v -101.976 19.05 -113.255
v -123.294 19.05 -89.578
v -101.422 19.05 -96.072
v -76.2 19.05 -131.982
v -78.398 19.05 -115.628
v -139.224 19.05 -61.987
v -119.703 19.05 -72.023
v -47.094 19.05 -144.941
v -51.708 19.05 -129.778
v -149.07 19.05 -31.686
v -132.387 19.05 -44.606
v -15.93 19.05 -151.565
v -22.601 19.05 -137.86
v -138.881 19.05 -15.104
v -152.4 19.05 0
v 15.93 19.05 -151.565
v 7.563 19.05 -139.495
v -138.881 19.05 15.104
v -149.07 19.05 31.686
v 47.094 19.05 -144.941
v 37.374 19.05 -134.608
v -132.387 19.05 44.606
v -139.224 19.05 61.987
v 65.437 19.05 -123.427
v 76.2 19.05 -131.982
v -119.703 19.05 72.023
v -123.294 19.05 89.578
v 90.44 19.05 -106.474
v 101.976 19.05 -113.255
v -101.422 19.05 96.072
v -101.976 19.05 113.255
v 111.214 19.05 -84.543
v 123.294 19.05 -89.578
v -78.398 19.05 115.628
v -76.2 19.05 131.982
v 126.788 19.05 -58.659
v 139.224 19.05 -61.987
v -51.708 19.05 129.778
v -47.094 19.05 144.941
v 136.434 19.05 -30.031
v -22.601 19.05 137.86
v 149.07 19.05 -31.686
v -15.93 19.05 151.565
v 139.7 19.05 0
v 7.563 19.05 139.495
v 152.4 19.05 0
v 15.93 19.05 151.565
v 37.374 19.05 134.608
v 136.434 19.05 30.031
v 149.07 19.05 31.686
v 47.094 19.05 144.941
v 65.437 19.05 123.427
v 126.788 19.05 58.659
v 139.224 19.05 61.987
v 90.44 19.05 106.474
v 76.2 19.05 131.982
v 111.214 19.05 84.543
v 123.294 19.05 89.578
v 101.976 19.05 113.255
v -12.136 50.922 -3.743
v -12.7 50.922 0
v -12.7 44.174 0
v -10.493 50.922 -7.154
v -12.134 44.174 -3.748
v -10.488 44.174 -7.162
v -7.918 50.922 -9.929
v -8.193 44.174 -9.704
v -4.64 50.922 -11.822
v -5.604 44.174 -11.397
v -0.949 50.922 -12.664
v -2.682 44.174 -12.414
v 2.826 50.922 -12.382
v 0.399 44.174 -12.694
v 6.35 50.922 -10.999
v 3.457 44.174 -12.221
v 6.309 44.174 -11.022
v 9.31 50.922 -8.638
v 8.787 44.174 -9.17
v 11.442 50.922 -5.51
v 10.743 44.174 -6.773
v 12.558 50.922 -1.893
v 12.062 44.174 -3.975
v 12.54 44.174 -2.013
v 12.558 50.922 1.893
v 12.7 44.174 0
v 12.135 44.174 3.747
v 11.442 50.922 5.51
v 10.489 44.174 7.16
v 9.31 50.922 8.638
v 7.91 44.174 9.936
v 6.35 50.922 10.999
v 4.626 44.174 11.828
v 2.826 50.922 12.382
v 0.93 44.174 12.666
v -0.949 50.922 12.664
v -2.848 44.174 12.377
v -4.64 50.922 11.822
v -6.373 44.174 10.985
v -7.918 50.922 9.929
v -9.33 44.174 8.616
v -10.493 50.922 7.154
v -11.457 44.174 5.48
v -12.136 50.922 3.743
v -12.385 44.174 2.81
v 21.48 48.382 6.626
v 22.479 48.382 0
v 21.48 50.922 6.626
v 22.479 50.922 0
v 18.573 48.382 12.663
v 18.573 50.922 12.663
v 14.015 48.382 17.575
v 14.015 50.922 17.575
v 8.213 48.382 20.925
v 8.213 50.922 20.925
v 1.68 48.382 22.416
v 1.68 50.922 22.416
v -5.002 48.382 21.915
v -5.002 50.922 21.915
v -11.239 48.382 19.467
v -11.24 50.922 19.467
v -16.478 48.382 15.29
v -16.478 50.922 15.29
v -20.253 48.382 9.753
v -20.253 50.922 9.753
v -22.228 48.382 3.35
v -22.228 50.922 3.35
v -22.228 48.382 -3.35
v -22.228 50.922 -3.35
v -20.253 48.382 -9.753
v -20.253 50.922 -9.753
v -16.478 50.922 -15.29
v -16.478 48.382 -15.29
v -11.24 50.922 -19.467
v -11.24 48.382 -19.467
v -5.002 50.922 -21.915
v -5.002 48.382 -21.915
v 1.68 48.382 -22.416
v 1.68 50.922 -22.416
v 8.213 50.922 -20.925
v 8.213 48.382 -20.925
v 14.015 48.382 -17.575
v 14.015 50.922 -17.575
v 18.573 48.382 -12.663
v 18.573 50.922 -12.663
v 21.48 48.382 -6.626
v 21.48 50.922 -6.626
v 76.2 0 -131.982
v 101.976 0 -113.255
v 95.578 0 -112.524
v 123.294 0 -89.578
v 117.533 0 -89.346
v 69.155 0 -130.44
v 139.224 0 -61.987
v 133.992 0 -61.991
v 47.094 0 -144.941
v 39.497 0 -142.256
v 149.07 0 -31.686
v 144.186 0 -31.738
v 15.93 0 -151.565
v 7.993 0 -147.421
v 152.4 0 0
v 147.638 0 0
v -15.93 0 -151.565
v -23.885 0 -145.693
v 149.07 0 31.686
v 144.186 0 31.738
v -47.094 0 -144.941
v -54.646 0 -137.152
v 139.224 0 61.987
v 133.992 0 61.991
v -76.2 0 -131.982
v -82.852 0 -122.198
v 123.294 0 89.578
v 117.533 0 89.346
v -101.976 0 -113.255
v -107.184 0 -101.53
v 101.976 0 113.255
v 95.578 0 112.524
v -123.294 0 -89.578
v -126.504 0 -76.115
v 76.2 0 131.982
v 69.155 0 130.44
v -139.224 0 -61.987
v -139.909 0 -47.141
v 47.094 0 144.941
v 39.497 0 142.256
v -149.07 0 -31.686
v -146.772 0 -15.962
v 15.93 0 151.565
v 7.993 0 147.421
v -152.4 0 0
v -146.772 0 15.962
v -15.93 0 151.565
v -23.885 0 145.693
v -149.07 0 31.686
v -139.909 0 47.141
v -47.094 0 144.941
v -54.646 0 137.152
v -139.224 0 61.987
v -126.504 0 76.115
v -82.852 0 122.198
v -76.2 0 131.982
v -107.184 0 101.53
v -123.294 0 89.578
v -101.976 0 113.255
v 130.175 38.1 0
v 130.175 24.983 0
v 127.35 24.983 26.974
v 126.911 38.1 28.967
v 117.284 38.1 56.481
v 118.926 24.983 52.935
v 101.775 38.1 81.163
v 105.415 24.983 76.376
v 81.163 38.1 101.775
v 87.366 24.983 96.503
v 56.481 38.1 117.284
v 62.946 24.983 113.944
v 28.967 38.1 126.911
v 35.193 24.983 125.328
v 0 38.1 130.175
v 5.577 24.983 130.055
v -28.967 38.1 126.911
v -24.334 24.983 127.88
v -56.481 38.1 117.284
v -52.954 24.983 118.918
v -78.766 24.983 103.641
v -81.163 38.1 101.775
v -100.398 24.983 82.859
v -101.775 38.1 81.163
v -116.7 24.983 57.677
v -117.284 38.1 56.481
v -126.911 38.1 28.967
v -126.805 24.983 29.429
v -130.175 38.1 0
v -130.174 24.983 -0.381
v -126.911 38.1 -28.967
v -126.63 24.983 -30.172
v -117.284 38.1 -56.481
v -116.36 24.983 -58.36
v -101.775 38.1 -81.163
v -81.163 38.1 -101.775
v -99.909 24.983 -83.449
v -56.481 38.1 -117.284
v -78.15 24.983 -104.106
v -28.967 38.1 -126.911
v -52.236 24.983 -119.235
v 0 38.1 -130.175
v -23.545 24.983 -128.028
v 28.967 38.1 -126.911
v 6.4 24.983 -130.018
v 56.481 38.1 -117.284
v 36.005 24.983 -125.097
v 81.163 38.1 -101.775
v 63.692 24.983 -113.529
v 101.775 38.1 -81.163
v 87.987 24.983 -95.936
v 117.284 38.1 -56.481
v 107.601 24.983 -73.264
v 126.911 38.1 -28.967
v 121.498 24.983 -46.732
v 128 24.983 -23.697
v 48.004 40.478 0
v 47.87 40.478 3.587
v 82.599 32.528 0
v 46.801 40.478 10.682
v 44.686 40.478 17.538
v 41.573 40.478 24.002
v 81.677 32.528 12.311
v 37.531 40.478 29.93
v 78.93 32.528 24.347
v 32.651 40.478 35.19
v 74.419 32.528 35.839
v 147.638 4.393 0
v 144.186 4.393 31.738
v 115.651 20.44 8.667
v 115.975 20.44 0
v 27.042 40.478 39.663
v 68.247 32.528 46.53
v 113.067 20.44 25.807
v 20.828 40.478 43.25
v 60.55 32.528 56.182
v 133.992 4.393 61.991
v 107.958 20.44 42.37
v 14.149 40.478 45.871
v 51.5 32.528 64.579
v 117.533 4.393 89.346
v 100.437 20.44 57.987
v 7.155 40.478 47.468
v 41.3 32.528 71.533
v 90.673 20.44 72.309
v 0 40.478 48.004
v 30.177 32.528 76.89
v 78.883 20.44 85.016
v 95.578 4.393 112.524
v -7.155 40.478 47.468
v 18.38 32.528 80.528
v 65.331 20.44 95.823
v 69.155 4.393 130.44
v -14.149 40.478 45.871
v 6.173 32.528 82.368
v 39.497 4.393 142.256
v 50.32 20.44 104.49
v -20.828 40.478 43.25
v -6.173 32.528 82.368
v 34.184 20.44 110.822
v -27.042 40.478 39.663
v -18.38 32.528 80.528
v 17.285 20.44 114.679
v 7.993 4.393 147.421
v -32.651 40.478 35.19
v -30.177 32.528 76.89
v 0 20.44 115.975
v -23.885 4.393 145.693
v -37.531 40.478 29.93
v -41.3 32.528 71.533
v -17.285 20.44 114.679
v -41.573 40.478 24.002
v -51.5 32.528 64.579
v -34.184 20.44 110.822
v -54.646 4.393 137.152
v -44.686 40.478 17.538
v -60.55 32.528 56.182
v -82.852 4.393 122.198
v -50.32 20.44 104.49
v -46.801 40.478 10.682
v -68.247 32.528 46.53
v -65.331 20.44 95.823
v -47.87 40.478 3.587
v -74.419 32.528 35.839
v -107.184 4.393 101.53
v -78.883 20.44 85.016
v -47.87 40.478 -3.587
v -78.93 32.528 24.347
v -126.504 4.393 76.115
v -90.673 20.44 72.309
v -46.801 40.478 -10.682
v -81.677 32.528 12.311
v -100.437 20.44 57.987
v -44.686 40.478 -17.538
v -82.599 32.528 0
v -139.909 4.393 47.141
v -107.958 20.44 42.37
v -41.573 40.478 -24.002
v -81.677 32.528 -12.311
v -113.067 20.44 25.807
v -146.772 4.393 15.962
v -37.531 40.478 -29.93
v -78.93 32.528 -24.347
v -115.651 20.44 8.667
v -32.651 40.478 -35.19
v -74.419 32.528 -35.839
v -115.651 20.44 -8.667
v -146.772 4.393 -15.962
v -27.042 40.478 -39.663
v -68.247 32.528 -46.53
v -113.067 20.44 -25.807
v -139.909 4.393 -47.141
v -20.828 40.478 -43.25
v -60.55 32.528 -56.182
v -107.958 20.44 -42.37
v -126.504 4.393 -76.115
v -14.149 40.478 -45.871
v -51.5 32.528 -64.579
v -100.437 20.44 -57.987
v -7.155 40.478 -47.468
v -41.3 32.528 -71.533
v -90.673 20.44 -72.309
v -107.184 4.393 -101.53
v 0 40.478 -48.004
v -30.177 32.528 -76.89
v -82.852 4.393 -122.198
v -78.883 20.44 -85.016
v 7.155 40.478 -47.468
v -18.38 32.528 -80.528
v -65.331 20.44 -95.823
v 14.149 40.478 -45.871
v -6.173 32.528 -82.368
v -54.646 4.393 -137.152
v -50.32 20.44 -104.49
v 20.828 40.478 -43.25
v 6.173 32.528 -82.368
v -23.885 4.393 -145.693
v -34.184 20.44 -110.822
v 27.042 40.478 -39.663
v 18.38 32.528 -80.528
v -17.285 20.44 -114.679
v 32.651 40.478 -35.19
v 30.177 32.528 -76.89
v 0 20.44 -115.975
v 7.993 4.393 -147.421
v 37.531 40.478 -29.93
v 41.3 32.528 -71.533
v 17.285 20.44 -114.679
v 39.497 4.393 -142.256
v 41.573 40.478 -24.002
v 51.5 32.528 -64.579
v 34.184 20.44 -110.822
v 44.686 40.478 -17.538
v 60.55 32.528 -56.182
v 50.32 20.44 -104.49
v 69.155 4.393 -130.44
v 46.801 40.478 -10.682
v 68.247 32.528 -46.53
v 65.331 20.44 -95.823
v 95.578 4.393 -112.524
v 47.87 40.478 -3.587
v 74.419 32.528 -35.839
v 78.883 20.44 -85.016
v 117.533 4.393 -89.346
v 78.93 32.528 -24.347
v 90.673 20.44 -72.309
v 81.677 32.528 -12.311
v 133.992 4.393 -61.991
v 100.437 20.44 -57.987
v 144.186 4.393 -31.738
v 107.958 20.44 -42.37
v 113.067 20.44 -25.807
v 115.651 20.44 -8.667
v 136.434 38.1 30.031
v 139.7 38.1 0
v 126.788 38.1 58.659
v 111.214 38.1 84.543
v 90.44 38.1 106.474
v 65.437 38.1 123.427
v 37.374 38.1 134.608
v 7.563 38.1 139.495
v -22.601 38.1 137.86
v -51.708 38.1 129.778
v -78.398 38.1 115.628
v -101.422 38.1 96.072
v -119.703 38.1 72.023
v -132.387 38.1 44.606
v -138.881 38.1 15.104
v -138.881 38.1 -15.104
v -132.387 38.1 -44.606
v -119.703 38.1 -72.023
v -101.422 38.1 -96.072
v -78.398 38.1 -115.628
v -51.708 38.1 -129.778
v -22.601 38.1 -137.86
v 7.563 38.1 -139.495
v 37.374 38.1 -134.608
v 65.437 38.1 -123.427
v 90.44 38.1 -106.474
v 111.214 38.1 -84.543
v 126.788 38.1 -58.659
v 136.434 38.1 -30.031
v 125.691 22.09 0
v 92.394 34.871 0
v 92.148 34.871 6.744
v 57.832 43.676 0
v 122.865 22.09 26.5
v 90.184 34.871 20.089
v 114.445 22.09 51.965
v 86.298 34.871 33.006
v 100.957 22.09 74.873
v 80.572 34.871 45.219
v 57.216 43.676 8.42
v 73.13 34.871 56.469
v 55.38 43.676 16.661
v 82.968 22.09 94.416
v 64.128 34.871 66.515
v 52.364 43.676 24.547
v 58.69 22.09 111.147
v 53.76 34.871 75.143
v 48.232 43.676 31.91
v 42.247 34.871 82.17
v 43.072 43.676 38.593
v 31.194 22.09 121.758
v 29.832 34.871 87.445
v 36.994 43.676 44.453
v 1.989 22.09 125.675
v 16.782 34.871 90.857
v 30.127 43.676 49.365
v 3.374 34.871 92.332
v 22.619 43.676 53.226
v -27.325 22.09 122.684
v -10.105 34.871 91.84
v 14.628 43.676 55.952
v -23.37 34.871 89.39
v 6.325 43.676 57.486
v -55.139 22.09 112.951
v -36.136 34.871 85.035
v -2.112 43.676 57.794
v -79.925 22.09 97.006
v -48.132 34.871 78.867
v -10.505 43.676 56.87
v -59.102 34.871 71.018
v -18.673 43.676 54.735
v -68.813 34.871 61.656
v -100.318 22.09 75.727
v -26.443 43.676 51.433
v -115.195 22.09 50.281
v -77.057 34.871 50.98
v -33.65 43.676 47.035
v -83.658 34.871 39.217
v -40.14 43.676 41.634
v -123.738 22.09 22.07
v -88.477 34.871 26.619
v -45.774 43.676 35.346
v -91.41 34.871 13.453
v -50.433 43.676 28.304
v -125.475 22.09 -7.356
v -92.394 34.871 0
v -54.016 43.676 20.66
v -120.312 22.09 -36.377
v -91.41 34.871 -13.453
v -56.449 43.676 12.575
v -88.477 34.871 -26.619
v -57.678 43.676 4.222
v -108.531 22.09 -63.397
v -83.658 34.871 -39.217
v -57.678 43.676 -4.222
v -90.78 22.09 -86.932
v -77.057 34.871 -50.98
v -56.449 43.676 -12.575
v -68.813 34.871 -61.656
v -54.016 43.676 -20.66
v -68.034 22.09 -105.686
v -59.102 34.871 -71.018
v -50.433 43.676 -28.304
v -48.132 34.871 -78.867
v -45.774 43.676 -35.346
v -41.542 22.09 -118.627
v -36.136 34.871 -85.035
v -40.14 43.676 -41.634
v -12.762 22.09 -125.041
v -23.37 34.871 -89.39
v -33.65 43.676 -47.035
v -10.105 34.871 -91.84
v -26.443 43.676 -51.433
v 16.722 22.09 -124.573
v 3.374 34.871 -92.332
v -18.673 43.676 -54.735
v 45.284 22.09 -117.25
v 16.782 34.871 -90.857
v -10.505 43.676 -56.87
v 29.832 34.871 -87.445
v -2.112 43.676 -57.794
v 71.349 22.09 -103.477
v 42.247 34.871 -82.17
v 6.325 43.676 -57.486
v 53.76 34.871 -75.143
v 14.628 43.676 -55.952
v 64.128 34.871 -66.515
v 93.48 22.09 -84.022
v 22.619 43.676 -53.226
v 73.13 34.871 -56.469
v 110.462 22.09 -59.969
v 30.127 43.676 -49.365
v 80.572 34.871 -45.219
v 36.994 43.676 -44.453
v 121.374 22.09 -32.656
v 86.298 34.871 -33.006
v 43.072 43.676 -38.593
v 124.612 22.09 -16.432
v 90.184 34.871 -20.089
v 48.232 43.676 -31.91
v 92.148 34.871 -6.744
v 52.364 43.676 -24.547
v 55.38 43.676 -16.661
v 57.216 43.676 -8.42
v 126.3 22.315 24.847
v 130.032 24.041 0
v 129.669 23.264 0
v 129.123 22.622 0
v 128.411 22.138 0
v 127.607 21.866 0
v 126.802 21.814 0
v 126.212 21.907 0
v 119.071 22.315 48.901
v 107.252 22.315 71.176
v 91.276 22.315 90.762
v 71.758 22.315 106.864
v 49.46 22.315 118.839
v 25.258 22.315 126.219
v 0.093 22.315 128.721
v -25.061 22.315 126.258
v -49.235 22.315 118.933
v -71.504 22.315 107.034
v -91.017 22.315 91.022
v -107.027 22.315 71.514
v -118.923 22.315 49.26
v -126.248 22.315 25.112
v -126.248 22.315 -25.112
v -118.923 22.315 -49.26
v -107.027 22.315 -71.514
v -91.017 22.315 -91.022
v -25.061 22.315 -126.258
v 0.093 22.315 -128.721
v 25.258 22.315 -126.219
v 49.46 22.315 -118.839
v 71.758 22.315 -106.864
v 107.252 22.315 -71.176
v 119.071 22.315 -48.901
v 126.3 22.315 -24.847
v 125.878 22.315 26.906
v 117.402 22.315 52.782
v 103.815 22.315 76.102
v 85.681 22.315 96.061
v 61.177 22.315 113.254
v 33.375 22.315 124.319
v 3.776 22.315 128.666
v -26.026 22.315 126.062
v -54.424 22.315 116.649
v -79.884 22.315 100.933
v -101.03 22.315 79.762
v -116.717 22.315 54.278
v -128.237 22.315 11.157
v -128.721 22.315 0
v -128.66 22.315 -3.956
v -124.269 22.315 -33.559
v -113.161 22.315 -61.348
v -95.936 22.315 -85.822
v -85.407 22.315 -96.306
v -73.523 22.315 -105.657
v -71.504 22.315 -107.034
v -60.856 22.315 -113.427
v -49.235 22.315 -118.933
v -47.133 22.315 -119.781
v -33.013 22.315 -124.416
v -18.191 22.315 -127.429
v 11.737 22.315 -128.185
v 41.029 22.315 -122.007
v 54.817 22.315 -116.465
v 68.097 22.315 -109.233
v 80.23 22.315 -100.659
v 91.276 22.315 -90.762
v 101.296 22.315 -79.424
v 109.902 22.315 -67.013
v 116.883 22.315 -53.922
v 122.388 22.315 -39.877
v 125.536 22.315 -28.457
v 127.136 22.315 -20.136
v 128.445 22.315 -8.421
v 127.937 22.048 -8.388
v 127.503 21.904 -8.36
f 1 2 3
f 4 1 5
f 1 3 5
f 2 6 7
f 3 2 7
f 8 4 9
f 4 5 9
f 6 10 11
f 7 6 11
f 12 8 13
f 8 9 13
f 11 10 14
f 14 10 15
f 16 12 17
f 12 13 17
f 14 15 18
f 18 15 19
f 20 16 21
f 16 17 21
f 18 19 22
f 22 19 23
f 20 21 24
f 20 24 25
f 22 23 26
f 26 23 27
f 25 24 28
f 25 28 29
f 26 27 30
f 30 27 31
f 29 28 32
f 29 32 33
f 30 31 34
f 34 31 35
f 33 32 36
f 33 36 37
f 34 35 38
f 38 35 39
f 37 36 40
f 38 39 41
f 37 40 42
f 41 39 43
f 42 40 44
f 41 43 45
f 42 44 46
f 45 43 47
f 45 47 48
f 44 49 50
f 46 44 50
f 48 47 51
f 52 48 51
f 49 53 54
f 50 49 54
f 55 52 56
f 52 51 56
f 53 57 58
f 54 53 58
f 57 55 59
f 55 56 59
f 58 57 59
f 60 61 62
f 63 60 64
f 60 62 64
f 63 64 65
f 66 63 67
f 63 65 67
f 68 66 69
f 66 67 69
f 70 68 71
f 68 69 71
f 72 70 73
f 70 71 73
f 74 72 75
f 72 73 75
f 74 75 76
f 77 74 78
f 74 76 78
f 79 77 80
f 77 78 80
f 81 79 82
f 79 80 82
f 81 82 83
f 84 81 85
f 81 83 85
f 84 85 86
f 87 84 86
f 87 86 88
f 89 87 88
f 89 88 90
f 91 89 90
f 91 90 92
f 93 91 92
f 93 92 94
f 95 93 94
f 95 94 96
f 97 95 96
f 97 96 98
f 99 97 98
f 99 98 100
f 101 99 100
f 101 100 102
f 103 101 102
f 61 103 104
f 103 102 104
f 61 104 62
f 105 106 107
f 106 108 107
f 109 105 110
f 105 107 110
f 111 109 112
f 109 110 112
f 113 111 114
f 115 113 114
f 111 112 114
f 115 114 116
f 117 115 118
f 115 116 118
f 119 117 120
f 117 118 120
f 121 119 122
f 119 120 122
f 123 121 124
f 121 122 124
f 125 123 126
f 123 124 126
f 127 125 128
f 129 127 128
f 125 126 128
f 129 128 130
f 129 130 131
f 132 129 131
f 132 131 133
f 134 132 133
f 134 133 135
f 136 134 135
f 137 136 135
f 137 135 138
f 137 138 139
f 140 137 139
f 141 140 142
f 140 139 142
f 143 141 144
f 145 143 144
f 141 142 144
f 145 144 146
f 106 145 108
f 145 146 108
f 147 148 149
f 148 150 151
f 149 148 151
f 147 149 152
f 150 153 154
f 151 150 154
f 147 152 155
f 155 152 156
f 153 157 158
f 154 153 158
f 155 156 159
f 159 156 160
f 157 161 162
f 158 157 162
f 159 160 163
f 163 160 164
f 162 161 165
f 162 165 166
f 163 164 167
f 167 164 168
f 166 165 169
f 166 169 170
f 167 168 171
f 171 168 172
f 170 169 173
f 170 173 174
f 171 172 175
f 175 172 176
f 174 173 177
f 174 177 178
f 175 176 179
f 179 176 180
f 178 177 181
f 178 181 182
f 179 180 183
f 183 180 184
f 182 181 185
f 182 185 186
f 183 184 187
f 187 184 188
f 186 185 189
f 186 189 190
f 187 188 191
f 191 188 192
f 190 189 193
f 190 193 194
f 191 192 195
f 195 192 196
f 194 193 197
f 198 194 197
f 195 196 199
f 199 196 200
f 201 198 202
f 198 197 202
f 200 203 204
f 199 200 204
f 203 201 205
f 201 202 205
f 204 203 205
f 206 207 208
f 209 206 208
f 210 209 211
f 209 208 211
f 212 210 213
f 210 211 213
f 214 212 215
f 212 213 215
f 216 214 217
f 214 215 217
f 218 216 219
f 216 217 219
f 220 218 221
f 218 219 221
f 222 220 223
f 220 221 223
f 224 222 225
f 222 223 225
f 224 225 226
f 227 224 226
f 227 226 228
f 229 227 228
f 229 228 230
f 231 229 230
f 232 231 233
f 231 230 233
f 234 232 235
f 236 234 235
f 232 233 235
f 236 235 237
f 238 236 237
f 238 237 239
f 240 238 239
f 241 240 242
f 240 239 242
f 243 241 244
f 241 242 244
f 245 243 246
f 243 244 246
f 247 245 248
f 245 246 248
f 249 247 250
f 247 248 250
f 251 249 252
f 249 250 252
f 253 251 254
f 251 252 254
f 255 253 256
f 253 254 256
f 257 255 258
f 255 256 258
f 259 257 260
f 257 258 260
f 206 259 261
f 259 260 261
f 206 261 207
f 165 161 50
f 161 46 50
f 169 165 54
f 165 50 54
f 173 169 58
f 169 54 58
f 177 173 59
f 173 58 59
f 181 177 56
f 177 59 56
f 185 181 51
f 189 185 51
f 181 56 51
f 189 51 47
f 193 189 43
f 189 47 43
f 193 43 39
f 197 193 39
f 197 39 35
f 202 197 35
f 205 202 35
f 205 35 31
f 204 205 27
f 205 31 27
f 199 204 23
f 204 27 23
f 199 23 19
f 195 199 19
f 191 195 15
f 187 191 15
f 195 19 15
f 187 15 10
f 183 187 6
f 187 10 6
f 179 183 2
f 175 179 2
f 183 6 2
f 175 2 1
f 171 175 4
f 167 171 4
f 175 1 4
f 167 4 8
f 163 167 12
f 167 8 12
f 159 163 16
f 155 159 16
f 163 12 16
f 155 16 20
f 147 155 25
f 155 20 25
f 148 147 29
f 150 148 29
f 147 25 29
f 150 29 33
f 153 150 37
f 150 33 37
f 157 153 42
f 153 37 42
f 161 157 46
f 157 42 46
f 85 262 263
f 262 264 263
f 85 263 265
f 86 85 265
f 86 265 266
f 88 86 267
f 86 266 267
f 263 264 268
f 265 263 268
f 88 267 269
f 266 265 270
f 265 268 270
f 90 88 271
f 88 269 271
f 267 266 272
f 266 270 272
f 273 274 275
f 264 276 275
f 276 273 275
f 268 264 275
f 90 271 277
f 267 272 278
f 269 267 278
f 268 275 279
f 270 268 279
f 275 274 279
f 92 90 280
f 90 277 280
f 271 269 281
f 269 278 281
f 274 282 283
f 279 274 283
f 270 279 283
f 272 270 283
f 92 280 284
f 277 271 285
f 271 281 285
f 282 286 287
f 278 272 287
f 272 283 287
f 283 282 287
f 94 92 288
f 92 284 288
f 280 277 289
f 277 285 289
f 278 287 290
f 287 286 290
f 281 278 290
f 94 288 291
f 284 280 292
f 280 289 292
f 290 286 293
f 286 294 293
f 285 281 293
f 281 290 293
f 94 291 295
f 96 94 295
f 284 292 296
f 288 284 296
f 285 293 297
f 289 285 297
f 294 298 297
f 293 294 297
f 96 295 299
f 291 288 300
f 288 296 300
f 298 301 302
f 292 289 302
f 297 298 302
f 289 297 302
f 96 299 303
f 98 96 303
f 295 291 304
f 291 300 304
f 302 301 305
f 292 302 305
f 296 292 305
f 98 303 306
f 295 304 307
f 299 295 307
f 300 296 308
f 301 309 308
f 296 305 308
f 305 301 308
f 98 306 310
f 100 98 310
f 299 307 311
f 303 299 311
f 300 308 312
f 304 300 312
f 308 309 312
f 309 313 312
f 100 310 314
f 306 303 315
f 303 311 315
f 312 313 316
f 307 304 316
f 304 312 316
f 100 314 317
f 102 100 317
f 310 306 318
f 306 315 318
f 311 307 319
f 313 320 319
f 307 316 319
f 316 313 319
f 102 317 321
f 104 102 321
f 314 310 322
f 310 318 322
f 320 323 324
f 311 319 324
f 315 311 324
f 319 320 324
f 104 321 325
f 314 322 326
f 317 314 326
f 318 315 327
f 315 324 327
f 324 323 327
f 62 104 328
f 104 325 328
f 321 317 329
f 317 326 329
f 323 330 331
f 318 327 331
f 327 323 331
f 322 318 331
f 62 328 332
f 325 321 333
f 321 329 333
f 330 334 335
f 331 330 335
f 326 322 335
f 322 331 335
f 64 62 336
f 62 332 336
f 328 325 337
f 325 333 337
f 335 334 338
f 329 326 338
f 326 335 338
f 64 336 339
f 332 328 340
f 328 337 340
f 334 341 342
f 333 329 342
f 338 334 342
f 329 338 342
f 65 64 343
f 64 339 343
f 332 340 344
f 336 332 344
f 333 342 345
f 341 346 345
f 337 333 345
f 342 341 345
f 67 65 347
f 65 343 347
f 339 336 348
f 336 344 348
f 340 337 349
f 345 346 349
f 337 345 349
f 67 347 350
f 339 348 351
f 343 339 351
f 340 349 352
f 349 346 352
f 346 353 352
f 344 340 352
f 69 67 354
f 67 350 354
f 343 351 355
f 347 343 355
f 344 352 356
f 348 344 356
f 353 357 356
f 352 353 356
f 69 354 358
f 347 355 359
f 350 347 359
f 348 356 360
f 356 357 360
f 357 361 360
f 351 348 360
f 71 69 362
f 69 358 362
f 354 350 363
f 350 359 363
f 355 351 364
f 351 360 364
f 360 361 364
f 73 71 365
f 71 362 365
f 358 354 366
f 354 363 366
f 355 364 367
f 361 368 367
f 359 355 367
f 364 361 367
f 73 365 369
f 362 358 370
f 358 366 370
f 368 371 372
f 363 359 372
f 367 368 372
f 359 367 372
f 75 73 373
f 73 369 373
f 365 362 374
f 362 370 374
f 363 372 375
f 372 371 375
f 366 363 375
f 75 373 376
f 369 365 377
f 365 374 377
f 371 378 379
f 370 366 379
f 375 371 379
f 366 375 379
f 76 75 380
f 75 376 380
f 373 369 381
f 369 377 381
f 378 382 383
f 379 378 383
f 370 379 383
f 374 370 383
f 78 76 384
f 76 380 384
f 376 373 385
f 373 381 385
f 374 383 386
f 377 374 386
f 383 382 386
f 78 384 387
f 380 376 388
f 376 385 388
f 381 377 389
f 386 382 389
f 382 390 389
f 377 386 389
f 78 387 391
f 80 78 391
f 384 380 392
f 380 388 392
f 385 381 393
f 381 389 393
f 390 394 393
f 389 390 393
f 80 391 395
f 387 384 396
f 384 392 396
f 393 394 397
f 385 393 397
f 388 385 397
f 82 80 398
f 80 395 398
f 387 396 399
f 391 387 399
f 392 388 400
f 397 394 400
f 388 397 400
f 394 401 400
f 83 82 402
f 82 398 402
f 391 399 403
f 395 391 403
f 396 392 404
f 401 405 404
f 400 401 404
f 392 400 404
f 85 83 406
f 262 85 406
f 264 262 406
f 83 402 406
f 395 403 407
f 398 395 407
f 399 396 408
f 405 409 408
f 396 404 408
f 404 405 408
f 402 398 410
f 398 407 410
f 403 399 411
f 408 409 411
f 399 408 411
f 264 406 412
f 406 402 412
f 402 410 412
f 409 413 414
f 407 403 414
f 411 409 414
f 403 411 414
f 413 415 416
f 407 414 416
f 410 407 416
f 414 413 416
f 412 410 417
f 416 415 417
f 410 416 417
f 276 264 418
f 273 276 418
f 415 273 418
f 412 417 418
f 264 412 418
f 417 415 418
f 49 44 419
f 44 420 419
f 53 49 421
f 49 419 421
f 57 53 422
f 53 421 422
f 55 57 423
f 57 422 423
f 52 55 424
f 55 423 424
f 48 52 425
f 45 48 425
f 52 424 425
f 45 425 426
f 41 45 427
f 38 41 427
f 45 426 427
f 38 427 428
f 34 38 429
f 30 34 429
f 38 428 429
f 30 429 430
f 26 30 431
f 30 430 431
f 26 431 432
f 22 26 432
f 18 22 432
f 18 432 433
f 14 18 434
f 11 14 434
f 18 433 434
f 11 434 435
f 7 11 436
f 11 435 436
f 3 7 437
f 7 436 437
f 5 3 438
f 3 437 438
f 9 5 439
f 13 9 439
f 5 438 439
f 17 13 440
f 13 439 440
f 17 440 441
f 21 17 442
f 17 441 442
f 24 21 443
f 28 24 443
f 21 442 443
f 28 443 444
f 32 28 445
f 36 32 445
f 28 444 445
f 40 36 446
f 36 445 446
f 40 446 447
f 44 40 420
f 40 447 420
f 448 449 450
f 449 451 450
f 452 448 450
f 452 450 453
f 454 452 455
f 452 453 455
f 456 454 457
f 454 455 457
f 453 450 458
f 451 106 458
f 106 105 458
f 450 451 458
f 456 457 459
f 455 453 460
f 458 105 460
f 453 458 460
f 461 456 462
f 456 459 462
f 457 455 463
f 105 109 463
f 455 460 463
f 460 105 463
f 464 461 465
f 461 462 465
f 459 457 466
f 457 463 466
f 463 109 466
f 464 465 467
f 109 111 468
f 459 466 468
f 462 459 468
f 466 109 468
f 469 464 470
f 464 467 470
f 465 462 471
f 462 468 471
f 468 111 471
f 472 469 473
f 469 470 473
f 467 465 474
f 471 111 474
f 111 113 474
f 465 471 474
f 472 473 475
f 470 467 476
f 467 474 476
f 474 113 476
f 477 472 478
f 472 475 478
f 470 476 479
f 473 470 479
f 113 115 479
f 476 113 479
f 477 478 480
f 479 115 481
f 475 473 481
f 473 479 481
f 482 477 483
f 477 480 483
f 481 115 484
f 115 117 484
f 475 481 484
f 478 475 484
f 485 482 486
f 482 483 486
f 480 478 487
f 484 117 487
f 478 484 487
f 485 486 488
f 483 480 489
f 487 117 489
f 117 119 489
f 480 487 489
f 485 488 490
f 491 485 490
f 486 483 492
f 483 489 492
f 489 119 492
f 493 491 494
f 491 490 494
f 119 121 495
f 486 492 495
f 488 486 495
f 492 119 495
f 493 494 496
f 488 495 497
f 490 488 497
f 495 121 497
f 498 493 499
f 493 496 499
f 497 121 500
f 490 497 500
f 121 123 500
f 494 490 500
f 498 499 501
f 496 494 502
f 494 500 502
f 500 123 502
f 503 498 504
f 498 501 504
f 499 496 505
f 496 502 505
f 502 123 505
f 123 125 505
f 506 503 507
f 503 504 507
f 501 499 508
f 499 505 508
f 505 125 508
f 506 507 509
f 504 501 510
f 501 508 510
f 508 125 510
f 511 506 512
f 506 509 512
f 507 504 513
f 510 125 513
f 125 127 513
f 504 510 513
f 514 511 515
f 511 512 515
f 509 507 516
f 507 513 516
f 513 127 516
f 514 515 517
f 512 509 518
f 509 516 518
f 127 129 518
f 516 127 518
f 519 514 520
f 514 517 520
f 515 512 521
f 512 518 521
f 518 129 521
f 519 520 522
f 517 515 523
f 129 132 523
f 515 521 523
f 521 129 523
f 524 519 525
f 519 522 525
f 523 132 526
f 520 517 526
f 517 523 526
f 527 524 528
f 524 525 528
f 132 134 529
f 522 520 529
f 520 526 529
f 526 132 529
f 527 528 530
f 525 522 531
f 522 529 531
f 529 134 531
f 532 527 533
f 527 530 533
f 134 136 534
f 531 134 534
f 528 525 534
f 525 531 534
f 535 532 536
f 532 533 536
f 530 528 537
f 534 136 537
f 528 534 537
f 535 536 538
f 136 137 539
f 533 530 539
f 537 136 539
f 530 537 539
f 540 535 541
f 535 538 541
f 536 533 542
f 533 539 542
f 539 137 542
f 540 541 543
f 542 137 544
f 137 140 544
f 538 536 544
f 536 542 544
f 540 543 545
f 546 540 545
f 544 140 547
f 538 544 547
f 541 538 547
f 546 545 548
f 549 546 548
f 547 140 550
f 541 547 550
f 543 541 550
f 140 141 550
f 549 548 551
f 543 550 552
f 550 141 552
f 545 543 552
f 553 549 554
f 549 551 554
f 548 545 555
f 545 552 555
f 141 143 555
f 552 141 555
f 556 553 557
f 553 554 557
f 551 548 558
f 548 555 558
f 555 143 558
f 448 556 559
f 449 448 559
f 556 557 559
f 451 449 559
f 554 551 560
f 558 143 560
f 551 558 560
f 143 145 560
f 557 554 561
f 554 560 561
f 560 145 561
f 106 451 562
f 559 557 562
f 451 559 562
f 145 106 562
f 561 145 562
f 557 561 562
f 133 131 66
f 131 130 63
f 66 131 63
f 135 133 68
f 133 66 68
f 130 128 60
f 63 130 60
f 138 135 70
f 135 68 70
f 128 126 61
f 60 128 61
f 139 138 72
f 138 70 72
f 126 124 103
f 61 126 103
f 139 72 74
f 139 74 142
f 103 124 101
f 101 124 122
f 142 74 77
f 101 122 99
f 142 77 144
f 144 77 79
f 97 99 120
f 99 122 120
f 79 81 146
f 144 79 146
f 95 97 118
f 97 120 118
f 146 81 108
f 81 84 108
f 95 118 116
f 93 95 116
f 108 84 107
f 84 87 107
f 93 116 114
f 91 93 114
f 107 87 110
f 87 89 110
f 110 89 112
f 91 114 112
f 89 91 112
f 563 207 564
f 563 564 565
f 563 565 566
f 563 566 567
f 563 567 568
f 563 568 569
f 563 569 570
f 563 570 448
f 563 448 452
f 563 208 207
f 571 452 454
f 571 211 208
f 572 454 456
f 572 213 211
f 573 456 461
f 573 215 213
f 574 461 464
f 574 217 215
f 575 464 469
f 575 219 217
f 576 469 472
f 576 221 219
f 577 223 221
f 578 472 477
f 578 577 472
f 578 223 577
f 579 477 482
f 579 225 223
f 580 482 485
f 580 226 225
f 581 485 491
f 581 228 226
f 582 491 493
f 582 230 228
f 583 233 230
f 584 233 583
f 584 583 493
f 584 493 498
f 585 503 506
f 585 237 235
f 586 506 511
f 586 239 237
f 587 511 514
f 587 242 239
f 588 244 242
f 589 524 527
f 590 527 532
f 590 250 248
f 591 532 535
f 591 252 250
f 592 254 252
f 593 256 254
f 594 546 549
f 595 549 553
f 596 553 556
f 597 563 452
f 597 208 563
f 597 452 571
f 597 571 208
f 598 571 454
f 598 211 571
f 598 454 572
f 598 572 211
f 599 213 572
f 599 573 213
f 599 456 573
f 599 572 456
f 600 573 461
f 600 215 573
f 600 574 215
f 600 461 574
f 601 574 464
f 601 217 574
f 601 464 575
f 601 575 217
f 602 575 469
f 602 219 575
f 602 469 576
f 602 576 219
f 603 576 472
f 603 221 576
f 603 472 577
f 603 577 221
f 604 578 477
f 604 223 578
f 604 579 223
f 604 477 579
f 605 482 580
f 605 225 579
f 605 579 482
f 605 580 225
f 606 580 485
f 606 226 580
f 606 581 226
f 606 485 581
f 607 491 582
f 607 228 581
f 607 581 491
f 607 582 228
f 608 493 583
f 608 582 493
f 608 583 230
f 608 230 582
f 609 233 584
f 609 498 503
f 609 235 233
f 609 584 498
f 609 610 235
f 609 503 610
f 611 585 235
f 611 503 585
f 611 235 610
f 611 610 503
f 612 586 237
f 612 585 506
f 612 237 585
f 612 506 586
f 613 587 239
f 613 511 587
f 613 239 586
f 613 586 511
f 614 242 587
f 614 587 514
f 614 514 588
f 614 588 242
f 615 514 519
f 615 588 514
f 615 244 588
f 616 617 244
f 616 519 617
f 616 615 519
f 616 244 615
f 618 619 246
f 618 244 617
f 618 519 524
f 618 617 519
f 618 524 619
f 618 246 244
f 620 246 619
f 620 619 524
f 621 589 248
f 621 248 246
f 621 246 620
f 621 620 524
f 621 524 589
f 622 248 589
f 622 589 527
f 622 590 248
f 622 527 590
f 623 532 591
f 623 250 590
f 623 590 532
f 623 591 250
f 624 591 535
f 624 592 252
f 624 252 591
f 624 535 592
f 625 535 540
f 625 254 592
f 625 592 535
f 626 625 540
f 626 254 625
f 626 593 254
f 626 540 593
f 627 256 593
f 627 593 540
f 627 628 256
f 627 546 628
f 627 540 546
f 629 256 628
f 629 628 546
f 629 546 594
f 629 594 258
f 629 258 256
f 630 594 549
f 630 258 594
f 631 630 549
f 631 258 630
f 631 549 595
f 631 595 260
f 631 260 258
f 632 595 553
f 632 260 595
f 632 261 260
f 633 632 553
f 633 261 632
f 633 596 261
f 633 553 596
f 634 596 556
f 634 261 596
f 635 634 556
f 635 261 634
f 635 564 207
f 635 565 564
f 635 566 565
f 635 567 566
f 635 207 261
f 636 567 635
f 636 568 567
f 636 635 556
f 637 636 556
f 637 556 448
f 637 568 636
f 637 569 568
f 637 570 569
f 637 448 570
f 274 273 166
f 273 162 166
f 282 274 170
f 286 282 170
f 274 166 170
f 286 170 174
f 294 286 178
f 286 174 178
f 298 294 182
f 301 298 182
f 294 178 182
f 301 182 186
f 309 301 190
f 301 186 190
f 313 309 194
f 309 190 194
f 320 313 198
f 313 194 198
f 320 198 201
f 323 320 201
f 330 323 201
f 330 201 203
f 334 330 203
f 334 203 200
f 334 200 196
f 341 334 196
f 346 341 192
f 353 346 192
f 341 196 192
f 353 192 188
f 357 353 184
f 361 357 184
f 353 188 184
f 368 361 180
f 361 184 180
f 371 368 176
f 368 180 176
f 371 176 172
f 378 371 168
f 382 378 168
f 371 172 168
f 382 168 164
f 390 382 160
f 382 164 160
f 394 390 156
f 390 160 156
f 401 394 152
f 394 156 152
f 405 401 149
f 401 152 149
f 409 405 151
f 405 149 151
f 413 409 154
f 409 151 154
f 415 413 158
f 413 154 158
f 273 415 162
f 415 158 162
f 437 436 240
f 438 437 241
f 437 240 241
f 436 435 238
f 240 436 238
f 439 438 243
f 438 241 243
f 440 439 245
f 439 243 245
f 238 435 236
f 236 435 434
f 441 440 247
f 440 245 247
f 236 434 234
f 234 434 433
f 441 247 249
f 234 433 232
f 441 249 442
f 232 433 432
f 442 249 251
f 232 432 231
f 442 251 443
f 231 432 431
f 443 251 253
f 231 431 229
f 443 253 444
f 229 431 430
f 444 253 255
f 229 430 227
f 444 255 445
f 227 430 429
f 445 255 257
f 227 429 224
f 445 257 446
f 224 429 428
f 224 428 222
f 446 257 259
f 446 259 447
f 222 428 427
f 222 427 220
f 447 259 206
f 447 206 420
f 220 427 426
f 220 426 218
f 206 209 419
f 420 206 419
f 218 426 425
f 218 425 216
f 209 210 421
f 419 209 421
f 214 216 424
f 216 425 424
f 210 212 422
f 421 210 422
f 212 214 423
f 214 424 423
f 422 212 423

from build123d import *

# Parameters (mm, degrees)
FILLET1_R = 3.175
HOLE1_D   = 25.4


with BuildPart() as part:
    # Sketch1 → Revolve1 (revolve)
    with BuildSketch(Plane.XY):
        with BuildLine():
            Line((0, 50.922456672), (0, 44.45))
            ThreePointArc((0, 44.45), (76.487596697, 34.257888417), (147.6375, 4.392811034))
            Line((147.6375, 4.392811034), (147.6375, 0))
            Line((147.6375, 0), (152.4, 0))
            Line((152.4, 0), (152.4, 19.05))
            Line((152.4, 19.05), (139.7, 19.05))
            Line((139.7, 19.05), (139.7, 38.1))
            Line((139.7, 38.1), (130.175, 38.1))
            Line((130.175, 38.1), (130.175, 20.016399419))
            ThreePointArc((130.175, 20.016399419), (77.633557371, 39.159969489), (22.479, 48.382456672))
            Line((22.479, 48.382456672), (22.479, 50.922456672))
            Line((22.479, 50.922456672), (0, 50.922456672))
        make_face()
    revolve(axis=Axis((0, 50.922456672, 0), (0, -1, 0)))

    # Fillet1
    fillet1_edges = [part.edges().sort_by_distance(p)[0] for p in [
        (-130.175, 20.016399419, 0),
    ]]
    fillet(fillet1_edges, radius=FILLET1_R)

    # Hole1 (through all)
    with Locations(Plane(origin=(0, 50.922456672, 0), x_dir=(1, 0, 0), z_dir=(0, 1, 0))):
        with Locations((0, 0)):
            Hole(HOLE1_D / 2)


solid = part.part
